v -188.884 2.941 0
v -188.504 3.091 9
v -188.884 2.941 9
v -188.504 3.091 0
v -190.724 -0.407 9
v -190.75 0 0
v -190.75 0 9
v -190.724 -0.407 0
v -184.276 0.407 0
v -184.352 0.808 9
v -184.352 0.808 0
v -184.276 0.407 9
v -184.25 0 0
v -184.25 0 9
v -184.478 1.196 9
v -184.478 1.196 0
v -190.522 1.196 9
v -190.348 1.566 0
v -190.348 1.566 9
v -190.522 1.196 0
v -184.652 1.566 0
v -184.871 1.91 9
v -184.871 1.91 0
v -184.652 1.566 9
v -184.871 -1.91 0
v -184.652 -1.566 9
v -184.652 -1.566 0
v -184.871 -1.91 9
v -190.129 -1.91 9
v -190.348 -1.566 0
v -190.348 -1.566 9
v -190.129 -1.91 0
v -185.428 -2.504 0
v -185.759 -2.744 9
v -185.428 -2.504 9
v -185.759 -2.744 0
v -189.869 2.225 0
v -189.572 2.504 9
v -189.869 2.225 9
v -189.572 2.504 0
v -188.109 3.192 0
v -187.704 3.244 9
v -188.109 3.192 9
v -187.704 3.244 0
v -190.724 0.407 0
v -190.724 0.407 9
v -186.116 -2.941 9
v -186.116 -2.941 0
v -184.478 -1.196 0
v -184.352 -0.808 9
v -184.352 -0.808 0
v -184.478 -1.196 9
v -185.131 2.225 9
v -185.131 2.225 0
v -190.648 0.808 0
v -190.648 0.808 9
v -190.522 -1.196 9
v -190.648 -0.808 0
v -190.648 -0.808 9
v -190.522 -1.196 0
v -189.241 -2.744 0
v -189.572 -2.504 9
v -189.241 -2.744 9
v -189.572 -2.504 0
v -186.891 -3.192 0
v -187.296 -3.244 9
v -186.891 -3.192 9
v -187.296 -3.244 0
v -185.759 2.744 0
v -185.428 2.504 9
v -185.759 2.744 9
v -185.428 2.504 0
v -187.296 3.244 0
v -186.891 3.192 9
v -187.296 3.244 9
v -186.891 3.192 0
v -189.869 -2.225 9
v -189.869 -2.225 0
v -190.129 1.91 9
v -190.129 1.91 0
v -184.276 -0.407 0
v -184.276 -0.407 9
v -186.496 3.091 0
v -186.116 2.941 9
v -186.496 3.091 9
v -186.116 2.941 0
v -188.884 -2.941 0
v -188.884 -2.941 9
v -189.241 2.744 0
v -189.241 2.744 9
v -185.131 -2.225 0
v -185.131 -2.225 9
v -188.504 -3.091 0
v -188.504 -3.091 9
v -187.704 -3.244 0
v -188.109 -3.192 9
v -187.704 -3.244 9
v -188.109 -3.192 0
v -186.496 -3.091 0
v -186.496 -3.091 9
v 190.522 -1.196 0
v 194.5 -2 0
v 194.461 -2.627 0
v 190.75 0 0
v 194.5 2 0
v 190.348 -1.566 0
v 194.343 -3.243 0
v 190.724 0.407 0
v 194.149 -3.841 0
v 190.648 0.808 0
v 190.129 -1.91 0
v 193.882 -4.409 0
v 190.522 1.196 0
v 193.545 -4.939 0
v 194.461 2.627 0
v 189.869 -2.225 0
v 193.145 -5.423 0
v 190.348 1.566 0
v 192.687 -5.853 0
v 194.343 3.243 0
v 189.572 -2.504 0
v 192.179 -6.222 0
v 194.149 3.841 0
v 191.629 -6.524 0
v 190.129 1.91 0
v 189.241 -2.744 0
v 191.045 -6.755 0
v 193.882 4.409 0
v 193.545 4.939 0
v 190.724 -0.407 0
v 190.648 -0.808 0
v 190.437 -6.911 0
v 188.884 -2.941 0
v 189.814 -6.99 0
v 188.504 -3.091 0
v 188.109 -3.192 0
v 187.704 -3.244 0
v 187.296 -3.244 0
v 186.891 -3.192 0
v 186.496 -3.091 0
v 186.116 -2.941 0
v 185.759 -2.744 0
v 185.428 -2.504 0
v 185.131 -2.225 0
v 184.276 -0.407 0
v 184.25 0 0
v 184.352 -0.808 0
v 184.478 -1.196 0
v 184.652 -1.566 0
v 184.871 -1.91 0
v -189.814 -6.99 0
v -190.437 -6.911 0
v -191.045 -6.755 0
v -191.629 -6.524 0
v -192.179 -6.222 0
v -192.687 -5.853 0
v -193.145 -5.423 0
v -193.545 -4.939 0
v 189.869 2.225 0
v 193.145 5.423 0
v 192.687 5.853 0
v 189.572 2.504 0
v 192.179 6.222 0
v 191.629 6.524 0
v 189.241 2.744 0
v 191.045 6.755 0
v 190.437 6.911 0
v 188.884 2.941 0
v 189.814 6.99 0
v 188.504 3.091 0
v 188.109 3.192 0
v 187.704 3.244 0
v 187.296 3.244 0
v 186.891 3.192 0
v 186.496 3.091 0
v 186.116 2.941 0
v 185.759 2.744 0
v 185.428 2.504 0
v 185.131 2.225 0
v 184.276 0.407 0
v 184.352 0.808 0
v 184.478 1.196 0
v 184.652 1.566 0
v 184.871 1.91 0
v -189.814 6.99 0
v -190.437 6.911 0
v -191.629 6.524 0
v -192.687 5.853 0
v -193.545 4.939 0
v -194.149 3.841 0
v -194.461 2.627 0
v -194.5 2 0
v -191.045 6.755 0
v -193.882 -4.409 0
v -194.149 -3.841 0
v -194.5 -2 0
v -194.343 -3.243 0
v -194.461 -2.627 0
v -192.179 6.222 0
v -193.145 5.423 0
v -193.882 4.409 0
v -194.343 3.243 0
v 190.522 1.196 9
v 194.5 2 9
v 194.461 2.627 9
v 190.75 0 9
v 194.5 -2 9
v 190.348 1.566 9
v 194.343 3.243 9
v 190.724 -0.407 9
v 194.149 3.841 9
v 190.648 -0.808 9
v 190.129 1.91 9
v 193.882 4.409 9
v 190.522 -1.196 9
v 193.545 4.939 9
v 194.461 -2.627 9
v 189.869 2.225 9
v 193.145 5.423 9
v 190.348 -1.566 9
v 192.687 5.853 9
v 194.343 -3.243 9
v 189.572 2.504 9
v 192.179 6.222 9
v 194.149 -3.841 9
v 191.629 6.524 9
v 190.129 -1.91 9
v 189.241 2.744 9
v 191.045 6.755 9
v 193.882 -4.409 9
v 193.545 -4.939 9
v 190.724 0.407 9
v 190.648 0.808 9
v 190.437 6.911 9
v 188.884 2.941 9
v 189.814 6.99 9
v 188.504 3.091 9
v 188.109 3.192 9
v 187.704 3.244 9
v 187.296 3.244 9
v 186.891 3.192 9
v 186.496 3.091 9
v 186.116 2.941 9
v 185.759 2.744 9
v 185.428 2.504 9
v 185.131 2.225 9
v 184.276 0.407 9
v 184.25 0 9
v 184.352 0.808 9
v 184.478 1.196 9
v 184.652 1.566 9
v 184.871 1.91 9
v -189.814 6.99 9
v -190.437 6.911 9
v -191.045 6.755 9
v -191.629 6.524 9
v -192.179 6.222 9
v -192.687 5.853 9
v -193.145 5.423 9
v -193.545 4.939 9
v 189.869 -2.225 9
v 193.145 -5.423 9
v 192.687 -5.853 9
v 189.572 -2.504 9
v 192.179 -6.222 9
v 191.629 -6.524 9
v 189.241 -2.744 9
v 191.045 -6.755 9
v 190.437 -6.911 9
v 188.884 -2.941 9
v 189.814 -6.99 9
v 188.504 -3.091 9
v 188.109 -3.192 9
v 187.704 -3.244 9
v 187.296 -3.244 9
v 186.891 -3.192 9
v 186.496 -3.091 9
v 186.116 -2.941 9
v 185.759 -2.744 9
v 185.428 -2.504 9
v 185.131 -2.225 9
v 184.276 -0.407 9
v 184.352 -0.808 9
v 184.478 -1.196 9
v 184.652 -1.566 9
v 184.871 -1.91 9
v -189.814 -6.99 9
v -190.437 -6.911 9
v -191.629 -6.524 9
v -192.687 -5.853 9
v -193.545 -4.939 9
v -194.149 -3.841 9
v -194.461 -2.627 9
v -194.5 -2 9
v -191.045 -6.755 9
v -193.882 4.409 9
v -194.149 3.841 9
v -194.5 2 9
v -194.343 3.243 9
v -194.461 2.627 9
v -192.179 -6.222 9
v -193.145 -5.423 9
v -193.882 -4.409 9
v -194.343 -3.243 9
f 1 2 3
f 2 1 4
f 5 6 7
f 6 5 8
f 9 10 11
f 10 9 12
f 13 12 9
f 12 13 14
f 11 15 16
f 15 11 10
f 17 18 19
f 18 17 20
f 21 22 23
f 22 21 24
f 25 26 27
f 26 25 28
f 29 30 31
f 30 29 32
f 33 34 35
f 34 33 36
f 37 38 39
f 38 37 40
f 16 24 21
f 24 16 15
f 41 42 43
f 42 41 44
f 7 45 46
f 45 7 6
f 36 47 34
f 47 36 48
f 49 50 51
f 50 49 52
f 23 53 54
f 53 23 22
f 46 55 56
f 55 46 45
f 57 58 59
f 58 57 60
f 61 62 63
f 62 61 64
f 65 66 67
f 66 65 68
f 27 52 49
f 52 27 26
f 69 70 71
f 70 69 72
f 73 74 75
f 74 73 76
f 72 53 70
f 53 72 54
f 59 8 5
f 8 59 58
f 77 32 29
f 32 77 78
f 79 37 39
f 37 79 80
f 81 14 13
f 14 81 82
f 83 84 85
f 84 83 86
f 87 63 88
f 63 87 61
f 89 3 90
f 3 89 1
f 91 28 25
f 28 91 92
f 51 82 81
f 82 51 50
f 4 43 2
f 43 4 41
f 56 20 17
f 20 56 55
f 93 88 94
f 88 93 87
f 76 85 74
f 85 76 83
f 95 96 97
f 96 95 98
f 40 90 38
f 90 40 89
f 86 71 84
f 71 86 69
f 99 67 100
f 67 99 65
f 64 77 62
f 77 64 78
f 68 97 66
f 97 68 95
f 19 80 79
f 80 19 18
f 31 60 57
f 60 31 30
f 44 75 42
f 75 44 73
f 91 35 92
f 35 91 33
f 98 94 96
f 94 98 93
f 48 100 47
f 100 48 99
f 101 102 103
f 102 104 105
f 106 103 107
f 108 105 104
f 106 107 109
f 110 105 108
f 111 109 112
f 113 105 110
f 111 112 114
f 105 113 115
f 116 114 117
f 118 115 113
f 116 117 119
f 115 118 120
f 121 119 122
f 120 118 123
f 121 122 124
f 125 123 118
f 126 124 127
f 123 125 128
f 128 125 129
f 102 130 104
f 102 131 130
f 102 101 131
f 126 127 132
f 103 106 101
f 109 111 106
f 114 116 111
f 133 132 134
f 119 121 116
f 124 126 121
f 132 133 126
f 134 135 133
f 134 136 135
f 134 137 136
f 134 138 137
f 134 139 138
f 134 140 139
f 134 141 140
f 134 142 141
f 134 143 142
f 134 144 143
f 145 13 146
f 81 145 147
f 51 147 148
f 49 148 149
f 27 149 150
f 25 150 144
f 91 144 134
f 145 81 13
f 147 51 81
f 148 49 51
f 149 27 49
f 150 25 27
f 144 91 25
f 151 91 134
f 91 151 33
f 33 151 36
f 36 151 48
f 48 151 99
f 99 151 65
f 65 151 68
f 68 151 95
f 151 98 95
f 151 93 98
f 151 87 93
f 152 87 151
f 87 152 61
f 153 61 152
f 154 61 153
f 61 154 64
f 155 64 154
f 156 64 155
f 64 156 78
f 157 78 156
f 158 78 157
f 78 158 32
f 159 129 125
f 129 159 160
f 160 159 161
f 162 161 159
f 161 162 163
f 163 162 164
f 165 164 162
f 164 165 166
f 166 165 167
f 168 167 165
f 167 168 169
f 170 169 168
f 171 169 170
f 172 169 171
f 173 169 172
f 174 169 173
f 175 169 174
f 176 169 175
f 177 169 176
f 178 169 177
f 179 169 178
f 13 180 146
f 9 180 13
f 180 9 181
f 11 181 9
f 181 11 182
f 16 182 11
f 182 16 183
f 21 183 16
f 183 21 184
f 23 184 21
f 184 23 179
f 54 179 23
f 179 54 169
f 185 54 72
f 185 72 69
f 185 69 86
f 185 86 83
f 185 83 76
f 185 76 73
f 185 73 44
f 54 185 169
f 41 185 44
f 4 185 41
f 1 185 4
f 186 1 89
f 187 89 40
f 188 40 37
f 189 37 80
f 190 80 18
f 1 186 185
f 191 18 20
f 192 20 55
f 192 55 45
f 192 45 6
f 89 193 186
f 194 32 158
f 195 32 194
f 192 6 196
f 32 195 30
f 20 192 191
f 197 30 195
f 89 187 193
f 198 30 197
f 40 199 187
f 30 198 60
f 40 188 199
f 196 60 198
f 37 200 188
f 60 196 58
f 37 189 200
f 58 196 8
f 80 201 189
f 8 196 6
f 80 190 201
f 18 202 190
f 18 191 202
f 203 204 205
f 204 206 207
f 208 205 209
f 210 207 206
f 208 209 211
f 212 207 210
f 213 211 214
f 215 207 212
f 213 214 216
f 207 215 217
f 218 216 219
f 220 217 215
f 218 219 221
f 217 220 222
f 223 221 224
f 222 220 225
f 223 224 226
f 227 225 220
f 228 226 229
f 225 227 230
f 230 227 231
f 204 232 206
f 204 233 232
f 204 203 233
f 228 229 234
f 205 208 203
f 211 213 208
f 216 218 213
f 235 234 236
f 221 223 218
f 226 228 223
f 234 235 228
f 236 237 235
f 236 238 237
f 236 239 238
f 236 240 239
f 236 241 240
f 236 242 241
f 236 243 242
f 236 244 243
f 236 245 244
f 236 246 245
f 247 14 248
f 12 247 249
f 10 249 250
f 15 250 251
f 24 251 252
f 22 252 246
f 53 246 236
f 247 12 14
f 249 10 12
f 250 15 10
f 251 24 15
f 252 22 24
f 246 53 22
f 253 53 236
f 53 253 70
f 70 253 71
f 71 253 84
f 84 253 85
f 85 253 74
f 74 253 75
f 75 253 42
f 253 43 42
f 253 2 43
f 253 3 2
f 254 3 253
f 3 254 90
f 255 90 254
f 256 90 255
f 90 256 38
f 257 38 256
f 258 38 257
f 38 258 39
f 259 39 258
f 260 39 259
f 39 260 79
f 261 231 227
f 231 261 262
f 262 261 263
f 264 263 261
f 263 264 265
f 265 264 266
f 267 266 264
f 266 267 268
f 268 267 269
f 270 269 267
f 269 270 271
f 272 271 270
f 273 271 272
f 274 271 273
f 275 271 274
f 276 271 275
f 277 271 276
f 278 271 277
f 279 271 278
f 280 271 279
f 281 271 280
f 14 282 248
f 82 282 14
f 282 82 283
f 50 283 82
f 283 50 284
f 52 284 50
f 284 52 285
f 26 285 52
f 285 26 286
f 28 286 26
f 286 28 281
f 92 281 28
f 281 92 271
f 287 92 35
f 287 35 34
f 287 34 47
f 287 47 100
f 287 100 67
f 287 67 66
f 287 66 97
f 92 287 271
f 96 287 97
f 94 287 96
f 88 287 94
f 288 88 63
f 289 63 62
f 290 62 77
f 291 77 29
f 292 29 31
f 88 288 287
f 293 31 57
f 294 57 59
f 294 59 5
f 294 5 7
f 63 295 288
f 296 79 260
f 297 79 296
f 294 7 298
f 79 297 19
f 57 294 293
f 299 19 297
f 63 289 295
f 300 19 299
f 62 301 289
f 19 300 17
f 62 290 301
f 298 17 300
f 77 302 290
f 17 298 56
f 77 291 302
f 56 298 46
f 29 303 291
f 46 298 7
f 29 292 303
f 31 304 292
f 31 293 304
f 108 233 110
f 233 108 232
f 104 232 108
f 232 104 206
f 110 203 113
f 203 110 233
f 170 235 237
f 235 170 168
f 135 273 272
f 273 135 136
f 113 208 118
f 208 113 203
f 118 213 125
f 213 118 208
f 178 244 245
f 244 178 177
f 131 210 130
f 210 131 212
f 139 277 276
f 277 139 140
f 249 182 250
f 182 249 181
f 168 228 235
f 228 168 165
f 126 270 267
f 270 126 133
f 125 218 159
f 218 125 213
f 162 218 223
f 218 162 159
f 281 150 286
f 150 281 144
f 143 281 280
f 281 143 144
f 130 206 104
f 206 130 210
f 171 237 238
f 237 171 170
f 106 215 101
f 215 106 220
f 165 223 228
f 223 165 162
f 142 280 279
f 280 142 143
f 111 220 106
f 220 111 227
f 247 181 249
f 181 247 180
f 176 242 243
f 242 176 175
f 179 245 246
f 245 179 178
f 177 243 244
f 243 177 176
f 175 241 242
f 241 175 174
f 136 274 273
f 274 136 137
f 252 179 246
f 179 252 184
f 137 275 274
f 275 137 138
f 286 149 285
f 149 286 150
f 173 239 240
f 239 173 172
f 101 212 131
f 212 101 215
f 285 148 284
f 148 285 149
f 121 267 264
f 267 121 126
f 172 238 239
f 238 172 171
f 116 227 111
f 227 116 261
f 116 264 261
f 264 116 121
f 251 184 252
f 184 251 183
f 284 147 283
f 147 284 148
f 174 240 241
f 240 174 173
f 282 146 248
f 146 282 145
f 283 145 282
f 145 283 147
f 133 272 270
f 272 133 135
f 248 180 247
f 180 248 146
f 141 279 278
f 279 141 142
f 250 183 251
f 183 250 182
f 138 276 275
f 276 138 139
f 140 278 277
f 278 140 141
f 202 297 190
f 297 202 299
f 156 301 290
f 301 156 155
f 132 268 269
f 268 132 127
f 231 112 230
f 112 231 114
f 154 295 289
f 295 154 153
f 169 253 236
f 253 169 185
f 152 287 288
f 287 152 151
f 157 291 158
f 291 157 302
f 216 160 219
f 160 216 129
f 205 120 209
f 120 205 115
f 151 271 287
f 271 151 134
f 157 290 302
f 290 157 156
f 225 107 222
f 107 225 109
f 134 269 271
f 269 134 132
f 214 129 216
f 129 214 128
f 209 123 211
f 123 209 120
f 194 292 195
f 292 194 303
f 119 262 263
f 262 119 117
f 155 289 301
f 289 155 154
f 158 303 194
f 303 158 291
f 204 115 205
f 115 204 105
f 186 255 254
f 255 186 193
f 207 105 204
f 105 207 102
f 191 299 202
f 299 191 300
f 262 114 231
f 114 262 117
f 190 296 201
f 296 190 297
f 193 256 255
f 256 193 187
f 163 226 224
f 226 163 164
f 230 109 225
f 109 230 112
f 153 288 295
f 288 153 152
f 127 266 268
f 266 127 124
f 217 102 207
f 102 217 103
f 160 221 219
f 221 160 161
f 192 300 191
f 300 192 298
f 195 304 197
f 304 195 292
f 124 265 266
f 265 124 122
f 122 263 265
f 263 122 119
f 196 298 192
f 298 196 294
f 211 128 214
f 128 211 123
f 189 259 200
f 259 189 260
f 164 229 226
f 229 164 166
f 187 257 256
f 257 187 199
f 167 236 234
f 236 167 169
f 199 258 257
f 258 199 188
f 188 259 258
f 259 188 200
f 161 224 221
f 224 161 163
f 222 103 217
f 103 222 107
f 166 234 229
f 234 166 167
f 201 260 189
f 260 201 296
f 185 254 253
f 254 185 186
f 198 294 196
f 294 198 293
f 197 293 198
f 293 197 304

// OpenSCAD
$fn = 50;


difference() {
	union() {
		hull() {
			translate(v = [-189.5000000000, 2.0000000000, 0]) {
				cylinder(h = 9, r = 5);
			}
			translate(v = [189.5000000000, 2.0000000000, 0]) {
				cylinder(h = 9, r = 5);
			}
			translate(v = [-189.5000000000, -2.0000000000, 0]) {
				cylinder(h = 9, r = 5);
			}
			translate(v = [189.5000000000, -2.0000000000, 0]) {
				cylinder(h = 9, r = 5);
			}
		}
	}
	union() {
		translate(v = [-187.5000000000, 0.0000000000, 0]) {
			cylinder(h = 9, r = 3.2500000000);
		}
		translate(v = [187.5000000000, 0.0000000000, 0]) {
			cylinder(h = 9, r = 3.2500000000);
		}
		translate(v = [-187.5000000000, 0.0000000000, 0]) {
			cylinder(h = 9, r = 1.8000000000);
		}
		translate(v = [187.5000000000, 0.0000000000, 0]) {
			cylinder(h = 9, r = 1.8000000000);
		}
		translate(v = [-187.5000000000, 0.0000000000, 0]) {
			cylinder(h = 9, r = 1.8000000000);
		}
		translate(v = [187.5000000000, 0.0000000000, 0]) {
			cylinder(h = 9, r = 1.8000000000);
		}
		translate(v = [-187.5000000000, 0.0000000000, 0]) {
			cylinder(h = 9, r = 1.8000000000);
		}
		translate(v = [187.5000000000, 0.0000000000, 0]) {
			cylinder(h = 9, r = 1.8000000000);
		}
	}
}
